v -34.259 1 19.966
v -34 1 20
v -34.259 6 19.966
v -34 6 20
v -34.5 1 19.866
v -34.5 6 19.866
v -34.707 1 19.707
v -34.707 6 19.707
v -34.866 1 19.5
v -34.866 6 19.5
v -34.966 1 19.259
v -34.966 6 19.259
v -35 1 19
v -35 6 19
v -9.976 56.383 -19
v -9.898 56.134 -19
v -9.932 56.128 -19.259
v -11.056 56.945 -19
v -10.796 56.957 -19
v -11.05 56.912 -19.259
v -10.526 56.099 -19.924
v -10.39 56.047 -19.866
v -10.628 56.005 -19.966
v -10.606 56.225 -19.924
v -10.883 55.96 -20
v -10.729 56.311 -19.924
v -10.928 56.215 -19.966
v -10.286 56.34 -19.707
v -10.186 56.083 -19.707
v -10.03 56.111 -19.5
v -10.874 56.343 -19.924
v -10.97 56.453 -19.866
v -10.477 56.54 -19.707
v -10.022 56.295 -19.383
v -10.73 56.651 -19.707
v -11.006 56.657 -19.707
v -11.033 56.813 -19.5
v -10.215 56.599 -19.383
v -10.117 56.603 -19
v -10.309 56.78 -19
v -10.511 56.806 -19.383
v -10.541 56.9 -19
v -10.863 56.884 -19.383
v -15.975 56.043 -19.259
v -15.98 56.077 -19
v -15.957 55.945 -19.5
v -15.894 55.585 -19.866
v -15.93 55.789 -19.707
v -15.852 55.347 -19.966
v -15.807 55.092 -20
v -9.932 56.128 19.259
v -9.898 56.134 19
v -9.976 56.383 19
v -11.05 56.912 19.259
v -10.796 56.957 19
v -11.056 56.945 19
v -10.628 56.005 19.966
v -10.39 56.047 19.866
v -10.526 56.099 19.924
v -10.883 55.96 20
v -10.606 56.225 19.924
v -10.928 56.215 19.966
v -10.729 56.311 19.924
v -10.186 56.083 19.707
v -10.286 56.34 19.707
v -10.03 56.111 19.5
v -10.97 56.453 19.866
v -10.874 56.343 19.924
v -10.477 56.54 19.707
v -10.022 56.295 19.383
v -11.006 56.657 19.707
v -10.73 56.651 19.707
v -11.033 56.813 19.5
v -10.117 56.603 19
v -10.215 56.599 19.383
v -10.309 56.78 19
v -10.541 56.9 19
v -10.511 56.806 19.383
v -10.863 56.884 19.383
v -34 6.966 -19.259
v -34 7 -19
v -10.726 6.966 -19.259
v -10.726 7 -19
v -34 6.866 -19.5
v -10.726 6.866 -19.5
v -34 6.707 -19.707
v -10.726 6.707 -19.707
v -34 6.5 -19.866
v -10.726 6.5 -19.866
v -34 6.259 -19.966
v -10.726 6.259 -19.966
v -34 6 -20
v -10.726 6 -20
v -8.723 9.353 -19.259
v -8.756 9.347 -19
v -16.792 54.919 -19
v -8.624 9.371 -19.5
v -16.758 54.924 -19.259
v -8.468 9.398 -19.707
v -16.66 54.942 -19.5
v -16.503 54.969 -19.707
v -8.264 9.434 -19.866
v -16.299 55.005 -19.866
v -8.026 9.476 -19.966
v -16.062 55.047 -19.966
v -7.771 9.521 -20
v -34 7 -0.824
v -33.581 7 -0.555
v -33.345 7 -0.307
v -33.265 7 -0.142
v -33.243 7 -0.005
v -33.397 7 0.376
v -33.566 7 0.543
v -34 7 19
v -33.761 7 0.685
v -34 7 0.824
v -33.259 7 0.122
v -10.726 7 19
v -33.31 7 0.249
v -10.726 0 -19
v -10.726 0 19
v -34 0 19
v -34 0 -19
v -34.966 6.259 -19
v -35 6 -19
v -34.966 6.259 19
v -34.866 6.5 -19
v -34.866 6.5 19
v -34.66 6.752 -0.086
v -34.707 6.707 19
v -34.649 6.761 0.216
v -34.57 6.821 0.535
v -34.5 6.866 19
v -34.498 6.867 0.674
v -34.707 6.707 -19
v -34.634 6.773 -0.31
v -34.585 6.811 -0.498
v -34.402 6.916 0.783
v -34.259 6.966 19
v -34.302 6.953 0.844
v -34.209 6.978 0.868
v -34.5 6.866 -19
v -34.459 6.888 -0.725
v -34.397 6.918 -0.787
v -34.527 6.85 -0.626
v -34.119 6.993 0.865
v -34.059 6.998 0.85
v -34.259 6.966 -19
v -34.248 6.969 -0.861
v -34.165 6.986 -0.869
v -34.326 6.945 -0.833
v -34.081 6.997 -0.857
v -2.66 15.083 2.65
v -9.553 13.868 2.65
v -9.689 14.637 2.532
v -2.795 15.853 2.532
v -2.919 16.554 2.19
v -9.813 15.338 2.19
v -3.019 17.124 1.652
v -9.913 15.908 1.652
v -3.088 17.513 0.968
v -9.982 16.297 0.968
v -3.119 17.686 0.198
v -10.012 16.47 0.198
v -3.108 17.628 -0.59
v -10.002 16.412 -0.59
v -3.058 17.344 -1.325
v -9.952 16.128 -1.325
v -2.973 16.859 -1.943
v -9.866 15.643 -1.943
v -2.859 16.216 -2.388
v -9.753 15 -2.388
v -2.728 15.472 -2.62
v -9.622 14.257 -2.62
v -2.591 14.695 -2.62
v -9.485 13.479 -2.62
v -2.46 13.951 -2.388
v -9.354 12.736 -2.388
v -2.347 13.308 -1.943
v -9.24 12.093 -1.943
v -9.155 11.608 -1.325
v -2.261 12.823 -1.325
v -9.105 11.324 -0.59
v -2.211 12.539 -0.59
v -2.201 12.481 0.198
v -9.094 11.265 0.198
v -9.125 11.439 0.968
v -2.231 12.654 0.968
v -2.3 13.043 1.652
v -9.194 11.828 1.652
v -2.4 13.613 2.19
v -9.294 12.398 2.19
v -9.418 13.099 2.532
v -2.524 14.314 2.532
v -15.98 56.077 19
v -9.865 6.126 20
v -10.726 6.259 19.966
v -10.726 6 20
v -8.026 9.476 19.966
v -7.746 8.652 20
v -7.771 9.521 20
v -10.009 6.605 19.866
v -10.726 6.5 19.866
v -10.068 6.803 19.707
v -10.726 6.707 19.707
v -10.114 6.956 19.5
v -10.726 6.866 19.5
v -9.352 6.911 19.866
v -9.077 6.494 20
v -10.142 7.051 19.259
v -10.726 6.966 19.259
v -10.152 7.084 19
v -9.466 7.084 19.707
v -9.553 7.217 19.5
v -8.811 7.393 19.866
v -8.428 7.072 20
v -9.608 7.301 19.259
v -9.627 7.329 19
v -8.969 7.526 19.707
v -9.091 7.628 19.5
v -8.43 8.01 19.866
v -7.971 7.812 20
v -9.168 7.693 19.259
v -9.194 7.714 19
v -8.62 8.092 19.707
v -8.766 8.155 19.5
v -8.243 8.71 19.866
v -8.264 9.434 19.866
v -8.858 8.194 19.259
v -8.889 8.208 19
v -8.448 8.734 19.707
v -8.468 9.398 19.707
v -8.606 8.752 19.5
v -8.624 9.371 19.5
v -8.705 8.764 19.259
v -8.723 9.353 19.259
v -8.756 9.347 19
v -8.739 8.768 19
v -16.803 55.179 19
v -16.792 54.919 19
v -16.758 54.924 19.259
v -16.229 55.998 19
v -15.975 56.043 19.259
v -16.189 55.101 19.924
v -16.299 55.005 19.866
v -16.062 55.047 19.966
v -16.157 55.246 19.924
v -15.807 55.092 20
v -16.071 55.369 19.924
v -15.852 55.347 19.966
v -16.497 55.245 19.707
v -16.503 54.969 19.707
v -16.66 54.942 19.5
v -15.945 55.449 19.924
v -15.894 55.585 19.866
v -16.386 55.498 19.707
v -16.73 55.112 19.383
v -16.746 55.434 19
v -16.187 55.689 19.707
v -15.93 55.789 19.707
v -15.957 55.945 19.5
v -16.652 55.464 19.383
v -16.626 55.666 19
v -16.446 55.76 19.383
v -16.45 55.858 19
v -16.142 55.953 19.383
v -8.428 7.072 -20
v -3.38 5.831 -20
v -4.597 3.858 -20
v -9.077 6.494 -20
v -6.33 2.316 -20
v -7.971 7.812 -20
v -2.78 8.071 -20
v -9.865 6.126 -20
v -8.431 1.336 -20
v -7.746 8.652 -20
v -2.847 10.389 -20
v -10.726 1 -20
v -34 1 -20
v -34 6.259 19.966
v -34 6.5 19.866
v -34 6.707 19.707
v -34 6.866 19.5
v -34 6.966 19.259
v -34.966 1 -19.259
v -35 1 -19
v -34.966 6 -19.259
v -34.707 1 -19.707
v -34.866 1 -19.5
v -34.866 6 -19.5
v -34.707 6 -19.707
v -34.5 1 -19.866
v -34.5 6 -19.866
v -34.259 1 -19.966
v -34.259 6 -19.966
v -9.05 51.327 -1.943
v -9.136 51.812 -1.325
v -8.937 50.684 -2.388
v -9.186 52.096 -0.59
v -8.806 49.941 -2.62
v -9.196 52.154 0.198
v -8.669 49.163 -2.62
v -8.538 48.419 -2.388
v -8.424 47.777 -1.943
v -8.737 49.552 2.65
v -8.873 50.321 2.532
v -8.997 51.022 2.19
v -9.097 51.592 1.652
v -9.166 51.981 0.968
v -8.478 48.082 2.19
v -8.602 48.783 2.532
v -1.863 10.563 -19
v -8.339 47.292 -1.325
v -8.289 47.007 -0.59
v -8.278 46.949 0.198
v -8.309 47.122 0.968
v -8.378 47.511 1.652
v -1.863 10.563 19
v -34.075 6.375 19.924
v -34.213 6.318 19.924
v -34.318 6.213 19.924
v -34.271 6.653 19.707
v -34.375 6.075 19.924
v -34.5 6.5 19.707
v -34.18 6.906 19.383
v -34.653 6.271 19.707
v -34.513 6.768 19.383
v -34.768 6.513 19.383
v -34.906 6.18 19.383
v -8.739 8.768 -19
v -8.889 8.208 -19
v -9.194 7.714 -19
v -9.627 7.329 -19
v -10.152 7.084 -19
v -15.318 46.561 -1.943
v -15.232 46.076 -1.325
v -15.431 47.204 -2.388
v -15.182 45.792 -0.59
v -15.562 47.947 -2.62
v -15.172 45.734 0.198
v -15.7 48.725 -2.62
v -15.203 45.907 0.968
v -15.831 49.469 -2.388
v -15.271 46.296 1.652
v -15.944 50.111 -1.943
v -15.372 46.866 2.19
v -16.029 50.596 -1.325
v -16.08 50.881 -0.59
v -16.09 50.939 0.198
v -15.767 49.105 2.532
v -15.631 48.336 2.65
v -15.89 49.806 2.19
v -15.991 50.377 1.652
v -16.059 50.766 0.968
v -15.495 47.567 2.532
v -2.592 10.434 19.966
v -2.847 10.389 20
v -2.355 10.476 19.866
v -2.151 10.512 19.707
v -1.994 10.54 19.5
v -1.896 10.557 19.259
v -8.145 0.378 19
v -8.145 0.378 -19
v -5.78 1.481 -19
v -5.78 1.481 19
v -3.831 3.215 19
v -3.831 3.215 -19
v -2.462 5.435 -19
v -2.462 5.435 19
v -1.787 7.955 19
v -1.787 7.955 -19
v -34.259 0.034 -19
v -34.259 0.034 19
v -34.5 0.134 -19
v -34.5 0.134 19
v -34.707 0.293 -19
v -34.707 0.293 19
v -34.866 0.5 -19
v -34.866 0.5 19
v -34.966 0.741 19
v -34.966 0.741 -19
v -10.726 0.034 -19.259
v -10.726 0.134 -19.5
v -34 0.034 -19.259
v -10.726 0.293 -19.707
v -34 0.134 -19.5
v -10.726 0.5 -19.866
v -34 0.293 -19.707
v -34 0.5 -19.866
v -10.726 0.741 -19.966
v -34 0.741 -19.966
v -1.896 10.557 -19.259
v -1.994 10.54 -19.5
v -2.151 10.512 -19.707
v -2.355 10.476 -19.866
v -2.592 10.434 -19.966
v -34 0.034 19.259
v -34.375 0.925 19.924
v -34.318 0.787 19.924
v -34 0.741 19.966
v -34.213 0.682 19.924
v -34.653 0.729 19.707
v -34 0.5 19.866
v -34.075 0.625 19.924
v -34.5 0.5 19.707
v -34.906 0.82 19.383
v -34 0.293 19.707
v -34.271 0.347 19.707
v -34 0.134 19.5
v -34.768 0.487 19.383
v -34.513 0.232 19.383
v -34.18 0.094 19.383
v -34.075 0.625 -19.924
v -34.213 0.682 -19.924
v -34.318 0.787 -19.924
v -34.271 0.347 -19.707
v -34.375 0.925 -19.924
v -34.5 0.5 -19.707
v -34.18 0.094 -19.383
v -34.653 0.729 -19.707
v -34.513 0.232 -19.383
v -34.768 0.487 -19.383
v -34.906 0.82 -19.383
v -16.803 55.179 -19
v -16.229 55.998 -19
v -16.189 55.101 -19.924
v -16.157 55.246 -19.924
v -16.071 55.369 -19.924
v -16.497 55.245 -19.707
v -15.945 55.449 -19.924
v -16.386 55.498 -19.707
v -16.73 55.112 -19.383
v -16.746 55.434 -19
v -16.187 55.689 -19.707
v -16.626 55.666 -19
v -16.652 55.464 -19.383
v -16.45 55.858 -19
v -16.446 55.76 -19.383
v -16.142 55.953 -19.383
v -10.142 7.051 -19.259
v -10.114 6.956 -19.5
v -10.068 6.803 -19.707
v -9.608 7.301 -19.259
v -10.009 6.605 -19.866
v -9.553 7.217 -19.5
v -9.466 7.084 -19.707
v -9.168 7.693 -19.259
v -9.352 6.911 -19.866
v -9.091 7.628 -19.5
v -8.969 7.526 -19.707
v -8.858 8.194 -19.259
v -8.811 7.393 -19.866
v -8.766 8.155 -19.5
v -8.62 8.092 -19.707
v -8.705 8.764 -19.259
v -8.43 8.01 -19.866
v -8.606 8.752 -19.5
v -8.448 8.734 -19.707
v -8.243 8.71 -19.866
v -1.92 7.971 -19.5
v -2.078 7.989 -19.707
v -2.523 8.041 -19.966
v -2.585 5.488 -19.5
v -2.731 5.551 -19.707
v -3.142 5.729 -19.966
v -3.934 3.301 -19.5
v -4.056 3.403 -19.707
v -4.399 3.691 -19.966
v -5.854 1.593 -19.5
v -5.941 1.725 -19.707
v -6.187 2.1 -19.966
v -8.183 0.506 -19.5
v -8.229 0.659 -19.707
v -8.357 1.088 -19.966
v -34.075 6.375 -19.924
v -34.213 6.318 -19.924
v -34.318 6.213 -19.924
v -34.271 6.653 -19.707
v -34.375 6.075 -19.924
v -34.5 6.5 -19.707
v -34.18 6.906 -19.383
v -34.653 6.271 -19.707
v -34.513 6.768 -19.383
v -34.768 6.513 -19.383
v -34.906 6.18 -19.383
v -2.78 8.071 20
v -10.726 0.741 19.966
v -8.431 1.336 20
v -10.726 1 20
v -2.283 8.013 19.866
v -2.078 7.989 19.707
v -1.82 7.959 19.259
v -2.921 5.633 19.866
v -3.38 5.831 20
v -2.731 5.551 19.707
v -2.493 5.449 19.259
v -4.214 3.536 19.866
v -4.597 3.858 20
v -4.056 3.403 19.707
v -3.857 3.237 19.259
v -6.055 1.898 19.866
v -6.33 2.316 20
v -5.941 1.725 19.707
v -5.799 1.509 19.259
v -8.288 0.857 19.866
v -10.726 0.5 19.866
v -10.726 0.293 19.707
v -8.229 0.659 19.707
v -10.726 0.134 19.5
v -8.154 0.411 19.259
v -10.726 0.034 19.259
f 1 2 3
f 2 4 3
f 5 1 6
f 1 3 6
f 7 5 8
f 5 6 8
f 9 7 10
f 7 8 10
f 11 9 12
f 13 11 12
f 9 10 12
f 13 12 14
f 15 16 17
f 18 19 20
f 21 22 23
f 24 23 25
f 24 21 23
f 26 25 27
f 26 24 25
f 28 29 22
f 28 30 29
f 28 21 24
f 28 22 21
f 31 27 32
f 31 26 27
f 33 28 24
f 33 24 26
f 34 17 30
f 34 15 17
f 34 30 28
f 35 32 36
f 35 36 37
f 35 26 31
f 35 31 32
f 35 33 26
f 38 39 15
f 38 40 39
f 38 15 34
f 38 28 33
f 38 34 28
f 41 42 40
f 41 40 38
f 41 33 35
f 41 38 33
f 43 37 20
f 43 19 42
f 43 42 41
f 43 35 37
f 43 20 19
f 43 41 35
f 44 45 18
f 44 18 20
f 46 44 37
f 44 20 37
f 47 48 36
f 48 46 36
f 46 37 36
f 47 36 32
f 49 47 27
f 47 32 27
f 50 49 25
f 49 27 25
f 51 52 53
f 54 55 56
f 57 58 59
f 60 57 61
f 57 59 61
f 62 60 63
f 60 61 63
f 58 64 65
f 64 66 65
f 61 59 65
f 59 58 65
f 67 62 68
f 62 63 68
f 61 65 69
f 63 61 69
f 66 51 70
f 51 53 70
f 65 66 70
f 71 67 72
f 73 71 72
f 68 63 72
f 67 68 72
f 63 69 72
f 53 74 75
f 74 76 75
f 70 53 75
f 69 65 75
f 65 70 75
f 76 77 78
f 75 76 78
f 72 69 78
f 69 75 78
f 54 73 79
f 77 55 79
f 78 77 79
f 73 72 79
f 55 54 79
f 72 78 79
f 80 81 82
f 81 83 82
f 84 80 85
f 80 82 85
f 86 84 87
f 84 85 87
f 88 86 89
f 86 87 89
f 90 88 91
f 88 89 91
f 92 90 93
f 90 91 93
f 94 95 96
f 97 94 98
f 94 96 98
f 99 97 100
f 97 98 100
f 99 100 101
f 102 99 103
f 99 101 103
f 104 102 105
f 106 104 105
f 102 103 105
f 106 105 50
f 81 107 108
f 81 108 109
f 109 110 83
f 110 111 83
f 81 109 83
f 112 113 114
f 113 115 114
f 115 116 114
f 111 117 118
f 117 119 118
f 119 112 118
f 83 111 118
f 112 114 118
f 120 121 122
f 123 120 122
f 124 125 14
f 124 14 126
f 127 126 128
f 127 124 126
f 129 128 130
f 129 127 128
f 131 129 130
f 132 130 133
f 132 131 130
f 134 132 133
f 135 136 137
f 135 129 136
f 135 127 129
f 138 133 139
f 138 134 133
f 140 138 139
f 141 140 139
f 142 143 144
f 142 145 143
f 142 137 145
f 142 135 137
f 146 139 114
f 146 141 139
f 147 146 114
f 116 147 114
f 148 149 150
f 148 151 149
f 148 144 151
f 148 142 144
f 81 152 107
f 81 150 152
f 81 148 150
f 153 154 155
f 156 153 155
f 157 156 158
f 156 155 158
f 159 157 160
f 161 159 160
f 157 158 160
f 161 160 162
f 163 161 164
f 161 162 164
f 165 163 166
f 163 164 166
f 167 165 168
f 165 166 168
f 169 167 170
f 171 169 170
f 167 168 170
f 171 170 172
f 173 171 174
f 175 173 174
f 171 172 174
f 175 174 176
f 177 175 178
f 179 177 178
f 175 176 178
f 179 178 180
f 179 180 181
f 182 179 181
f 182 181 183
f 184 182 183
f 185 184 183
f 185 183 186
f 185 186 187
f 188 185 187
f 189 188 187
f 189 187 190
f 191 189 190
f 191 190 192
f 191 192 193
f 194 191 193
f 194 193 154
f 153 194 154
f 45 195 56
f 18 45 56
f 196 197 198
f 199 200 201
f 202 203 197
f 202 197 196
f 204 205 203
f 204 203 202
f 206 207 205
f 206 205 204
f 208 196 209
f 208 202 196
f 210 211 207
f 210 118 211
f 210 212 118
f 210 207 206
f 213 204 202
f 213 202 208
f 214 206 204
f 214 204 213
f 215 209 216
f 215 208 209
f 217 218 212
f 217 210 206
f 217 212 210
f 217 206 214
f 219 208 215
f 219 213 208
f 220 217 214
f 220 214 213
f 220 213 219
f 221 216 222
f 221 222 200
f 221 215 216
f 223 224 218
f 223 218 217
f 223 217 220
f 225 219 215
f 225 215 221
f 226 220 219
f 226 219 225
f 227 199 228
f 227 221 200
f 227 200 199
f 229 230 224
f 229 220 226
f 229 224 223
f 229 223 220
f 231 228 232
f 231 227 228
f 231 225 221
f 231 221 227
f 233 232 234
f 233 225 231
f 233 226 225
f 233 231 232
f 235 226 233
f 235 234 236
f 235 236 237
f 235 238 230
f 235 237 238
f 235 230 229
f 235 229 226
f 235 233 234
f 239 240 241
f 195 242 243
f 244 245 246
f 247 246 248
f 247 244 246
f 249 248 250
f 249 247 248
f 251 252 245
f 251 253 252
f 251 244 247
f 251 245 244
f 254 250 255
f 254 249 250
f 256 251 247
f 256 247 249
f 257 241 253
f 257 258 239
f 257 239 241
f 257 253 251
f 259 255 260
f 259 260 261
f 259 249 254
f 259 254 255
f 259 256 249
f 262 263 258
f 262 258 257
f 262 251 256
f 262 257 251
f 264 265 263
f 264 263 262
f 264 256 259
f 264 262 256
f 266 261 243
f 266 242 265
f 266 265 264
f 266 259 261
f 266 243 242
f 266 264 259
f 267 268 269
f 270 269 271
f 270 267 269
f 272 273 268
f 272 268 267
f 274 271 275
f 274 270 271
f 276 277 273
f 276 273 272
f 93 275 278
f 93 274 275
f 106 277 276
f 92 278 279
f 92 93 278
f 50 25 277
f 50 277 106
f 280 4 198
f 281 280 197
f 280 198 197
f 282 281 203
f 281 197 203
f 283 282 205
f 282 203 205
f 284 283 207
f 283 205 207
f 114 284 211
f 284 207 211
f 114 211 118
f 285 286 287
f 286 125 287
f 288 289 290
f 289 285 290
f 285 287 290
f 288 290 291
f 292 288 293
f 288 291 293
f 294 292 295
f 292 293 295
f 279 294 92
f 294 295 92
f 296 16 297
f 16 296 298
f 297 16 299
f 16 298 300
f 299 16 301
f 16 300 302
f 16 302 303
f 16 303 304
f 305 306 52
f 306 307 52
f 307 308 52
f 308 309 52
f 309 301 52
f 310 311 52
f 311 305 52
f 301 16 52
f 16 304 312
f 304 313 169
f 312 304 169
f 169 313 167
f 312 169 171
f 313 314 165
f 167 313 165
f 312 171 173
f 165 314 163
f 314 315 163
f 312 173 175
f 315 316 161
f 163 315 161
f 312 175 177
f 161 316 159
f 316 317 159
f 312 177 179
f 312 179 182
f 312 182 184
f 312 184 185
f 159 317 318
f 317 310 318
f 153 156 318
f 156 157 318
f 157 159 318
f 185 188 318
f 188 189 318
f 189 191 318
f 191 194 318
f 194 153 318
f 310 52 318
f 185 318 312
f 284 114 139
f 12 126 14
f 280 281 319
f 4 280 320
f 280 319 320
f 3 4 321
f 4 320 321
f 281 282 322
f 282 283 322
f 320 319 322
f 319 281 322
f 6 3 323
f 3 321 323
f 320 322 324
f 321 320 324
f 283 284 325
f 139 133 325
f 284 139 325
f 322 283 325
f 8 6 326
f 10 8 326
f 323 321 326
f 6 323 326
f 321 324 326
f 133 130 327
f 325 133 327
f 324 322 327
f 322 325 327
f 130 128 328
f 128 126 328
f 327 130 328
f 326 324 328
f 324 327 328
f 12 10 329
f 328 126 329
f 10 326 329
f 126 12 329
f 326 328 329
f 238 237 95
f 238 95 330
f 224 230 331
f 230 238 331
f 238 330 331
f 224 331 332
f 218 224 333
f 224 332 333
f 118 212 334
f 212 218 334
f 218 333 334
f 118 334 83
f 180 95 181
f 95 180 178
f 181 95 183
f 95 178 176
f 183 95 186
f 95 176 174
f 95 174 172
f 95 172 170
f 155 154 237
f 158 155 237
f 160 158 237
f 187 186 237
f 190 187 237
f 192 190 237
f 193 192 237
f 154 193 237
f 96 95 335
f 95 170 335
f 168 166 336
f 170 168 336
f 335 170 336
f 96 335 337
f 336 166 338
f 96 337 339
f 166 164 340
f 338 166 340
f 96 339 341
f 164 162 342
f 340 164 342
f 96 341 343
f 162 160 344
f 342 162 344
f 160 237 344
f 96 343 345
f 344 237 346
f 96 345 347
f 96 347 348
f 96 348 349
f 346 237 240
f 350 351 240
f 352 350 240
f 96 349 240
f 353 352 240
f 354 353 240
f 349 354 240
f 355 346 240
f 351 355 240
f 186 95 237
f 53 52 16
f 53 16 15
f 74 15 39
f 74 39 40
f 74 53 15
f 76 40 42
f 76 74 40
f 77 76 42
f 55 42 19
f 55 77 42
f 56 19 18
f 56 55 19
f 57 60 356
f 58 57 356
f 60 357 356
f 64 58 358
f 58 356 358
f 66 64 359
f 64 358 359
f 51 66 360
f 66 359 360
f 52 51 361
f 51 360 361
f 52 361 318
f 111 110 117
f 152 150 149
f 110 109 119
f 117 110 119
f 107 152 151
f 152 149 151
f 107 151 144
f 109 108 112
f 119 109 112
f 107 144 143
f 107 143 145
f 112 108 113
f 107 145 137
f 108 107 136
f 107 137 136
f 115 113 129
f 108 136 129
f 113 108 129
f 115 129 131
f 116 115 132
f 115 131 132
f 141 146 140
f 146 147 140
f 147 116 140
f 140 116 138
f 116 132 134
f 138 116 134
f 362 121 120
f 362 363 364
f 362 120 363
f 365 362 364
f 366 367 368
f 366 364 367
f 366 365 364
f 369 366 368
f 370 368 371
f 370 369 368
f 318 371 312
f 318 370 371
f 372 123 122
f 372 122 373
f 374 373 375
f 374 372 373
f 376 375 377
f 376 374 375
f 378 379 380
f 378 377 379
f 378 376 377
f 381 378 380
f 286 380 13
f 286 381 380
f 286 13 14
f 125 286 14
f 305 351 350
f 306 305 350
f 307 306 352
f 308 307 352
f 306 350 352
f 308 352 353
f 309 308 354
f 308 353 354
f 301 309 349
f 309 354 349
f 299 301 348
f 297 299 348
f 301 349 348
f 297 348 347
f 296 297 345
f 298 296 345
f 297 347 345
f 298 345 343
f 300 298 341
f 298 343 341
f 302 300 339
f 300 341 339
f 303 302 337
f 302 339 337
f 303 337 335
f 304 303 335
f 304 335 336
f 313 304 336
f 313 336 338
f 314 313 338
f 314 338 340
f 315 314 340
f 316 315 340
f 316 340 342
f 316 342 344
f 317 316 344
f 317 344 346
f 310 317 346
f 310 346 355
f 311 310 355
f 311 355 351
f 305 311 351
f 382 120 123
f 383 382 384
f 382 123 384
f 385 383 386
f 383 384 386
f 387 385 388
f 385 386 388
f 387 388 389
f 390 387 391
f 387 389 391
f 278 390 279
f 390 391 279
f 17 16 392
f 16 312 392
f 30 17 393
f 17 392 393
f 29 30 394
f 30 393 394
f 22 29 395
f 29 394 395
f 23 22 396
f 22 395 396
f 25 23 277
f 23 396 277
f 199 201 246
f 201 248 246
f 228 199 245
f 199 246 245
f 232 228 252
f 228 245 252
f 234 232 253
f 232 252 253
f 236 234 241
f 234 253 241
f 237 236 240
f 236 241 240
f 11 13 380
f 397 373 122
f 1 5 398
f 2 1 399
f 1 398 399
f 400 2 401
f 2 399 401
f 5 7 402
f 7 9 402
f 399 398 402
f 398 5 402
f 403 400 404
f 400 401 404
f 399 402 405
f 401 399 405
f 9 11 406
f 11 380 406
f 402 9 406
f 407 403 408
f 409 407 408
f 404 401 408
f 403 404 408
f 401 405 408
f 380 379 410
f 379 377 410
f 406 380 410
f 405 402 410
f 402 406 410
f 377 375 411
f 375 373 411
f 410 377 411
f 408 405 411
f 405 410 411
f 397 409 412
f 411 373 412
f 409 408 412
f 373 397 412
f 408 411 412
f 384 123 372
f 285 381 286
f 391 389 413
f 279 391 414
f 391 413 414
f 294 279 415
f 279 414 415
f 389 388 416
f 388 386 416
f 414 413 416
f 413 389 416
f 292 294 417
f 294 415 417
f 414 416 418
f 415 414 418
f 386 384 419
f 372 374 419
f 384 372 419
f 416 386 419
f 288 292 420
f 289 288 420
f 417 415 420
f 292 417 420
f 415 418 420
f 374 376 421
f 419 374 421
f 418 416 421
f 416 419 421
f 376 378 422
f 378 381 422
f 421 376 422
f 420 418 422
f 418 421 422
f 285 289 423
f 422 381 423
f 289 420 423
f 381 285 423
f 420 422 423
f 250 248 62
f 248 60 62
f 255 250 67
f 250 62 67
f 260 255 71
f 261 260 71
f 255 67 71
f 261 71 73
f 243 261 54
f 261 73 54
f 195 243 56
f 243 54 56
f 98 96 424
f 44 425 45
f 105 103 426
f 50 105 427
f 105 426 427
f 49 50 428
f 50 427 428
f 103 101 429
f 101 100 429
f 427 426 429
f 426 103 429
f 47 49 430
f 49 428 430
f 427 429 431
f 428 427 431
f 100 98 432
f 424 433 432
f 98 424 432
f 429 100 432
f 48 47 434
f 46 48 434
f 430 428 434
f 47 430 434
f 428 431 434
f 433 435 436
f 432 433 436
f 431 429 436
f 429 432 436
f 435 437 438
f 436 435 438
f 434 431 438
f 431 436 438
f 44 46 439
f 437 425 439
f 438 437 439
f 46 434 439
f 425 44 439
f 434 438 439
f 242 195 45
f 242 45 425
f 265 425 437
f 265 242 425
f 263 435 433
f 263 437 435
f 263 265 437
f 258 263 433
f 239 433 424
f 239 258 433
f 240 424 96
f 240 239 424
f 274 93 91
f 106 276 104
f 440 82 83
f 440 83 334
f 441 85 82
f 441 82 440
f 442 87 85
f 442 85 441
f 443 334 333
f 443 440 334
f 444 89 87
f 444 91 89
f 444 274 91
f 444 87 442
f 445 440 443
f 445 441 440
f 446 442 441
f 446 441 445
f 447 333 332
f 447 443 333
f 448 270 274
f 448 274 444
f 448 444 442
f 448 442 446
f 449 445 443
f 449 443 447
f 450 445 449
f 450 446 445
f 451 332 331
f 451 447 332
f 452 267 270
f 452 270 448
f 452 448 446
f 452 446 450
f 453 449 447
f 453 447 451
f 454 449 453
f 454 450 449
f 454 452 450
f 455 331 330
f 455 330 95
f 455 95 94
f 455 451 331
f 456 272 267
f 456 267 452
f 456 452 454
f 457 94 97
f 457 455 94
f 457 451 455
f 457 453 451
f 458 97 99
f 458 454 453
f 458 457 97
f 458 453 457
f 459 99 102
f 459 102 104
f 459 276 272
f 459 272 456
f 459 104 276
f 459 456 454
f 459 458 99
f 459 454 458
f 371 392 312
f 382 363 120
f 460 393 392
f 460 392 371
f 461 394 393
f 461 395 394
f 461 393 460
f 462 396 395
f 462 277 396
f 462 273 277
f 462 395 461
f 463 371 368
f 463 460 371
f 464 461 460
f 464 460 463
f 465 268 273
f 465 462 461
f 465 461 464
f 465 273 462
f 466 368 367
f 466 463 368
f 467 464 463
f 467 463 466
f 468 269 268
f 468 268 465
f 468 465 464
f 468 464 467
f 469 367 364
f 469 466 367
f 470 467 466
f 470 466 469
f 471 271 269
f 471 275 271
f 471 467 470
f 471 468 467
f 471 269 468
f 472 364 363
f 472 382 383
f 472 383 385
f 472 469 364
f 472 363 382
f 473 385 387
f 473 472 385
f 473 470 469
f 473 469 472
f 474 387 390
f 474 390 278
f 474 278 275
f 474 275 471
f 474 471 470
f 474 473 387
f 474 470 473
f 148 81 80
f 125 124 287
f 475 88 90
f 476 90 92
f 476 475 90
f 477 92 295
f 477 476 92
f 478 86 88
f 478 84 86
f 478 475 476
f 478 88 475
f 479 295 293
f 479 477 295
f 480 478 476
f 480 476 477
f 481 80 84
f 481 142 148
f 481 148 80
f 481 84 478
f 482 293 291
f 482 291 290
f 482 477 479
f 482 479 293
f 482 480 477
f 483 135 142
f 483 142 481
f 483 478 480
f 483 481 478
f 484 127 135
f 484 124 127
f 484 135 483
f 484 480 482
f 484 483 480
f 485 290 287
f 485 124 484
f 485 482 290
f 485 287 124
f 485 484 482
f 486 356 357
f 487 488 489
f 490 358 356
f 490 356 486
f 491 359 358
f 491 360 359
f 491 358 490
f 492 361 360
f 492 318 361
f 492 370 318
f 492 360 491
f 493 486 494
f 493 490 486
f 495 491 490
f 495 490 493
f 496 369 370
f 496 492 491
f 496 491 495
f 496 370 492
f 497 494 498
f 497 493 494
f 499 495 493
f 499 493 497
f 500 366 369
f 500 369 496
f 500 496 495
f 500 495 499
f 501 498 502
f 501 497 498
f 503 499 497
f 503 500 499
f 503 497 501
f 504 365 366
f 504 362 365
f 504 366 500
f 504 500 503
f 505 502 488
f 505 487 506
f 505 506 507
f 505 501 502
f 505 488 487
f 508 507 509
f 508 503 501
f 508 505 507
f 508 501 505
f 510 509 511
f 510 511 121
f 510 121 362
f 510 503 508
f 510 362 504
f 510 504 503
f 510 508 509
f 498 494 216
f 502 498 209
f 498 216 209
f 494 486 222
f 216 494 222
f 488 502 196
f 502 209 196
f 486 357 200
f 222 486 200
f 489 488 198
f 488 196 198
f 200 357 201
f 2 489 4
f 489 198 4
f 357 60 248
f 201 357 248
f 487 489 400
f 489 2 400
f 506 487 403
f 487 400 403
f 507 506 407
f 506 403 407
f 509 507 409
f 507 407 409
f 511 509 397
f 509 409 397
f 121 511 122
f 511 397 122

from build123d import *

# Parameters (mm, degrees)
BOSS_EXTRUDE1_DEPTH = 20
FILLET2_R           = 2
FILLET3_R           = 9
FILLET1_R           = 1
HOLE1_D             = 5.3


with BuildPart() as part:
    # Sketch2 → Boss-Extrude1 (new, symmetric)
    with BuildSketch(Plane.XY):
        Polygon((0, 0), (-35, 0), (-35, 7), (-8.342275148, 7), (-16.965248576, 55.903312431), (-10.071594305, 57.118849675), align=None)
    extrude(amount=BOSS_EXTRUDE1_DEPTH, both=True)

    # Fillet2
    fillet2_edges = [part.edges().sort_by_distance(p)[0] for p in [
        (-8.342275148, 7, 0),
    ]]
    fillet(fillet2_edges, radius=FILLET2_R)

    # Fillet3
    fillet3_edges = [part.edges().sort_by_distance(p)[0] for p in [
        (0, 0, 0),
    ]]
    fillet(fillet3_edges, radius=FILLET3_R)

    # Fillet1
    fillet1_edges = [part.edges().sort_by_distance(p)[0] for p in [
        (-22.862891167, 0, 20),
        (-22.862891167, 7, 20),
        (-12.860707702, 32.625304393, 20),
        (-5.96705343, 33.840841637, 20),
        (-35, 7, 0),
        (-35, 3.5, 20),
        (-35, 0, 0),
        (-35, 3.5, -20),
        (-10.071594305, 57.118849675, 0),
        (-13.51842144, 56.511081053, 20),
        (-16.965248576, 55.903312431, 0),
        (-13.51842144, 56.511081053, -20),
        (-9.193693447, 7.714424781, 20),
        (-3.831382345, 3.214911513, 20),
        (-12.860707702, 32.625304393, -20),
        (-9.193693447, 7.714424781, -20),
        (-22.862891167, 7, -20),
        (-22.862891167, 0, -20),
        (-3.831382345, 3.214911513, -20),
        (-5.96705343, 33.840841637, -20),
    ]]
    fillet(fillet1_edges, radius=FILLET1_R)

    # Hole1 (through all)
    with Locations(Plane(origin=(0, 0, 0), x_dir=(0, 0, -1), z_dir=(0.984807753012208, 0.17364817766693083, 0))):
        with Locations((0, 50.31616731), (0, 15.31616731)):
            Hole(HOLE1_D / 2)


solid = part.part
